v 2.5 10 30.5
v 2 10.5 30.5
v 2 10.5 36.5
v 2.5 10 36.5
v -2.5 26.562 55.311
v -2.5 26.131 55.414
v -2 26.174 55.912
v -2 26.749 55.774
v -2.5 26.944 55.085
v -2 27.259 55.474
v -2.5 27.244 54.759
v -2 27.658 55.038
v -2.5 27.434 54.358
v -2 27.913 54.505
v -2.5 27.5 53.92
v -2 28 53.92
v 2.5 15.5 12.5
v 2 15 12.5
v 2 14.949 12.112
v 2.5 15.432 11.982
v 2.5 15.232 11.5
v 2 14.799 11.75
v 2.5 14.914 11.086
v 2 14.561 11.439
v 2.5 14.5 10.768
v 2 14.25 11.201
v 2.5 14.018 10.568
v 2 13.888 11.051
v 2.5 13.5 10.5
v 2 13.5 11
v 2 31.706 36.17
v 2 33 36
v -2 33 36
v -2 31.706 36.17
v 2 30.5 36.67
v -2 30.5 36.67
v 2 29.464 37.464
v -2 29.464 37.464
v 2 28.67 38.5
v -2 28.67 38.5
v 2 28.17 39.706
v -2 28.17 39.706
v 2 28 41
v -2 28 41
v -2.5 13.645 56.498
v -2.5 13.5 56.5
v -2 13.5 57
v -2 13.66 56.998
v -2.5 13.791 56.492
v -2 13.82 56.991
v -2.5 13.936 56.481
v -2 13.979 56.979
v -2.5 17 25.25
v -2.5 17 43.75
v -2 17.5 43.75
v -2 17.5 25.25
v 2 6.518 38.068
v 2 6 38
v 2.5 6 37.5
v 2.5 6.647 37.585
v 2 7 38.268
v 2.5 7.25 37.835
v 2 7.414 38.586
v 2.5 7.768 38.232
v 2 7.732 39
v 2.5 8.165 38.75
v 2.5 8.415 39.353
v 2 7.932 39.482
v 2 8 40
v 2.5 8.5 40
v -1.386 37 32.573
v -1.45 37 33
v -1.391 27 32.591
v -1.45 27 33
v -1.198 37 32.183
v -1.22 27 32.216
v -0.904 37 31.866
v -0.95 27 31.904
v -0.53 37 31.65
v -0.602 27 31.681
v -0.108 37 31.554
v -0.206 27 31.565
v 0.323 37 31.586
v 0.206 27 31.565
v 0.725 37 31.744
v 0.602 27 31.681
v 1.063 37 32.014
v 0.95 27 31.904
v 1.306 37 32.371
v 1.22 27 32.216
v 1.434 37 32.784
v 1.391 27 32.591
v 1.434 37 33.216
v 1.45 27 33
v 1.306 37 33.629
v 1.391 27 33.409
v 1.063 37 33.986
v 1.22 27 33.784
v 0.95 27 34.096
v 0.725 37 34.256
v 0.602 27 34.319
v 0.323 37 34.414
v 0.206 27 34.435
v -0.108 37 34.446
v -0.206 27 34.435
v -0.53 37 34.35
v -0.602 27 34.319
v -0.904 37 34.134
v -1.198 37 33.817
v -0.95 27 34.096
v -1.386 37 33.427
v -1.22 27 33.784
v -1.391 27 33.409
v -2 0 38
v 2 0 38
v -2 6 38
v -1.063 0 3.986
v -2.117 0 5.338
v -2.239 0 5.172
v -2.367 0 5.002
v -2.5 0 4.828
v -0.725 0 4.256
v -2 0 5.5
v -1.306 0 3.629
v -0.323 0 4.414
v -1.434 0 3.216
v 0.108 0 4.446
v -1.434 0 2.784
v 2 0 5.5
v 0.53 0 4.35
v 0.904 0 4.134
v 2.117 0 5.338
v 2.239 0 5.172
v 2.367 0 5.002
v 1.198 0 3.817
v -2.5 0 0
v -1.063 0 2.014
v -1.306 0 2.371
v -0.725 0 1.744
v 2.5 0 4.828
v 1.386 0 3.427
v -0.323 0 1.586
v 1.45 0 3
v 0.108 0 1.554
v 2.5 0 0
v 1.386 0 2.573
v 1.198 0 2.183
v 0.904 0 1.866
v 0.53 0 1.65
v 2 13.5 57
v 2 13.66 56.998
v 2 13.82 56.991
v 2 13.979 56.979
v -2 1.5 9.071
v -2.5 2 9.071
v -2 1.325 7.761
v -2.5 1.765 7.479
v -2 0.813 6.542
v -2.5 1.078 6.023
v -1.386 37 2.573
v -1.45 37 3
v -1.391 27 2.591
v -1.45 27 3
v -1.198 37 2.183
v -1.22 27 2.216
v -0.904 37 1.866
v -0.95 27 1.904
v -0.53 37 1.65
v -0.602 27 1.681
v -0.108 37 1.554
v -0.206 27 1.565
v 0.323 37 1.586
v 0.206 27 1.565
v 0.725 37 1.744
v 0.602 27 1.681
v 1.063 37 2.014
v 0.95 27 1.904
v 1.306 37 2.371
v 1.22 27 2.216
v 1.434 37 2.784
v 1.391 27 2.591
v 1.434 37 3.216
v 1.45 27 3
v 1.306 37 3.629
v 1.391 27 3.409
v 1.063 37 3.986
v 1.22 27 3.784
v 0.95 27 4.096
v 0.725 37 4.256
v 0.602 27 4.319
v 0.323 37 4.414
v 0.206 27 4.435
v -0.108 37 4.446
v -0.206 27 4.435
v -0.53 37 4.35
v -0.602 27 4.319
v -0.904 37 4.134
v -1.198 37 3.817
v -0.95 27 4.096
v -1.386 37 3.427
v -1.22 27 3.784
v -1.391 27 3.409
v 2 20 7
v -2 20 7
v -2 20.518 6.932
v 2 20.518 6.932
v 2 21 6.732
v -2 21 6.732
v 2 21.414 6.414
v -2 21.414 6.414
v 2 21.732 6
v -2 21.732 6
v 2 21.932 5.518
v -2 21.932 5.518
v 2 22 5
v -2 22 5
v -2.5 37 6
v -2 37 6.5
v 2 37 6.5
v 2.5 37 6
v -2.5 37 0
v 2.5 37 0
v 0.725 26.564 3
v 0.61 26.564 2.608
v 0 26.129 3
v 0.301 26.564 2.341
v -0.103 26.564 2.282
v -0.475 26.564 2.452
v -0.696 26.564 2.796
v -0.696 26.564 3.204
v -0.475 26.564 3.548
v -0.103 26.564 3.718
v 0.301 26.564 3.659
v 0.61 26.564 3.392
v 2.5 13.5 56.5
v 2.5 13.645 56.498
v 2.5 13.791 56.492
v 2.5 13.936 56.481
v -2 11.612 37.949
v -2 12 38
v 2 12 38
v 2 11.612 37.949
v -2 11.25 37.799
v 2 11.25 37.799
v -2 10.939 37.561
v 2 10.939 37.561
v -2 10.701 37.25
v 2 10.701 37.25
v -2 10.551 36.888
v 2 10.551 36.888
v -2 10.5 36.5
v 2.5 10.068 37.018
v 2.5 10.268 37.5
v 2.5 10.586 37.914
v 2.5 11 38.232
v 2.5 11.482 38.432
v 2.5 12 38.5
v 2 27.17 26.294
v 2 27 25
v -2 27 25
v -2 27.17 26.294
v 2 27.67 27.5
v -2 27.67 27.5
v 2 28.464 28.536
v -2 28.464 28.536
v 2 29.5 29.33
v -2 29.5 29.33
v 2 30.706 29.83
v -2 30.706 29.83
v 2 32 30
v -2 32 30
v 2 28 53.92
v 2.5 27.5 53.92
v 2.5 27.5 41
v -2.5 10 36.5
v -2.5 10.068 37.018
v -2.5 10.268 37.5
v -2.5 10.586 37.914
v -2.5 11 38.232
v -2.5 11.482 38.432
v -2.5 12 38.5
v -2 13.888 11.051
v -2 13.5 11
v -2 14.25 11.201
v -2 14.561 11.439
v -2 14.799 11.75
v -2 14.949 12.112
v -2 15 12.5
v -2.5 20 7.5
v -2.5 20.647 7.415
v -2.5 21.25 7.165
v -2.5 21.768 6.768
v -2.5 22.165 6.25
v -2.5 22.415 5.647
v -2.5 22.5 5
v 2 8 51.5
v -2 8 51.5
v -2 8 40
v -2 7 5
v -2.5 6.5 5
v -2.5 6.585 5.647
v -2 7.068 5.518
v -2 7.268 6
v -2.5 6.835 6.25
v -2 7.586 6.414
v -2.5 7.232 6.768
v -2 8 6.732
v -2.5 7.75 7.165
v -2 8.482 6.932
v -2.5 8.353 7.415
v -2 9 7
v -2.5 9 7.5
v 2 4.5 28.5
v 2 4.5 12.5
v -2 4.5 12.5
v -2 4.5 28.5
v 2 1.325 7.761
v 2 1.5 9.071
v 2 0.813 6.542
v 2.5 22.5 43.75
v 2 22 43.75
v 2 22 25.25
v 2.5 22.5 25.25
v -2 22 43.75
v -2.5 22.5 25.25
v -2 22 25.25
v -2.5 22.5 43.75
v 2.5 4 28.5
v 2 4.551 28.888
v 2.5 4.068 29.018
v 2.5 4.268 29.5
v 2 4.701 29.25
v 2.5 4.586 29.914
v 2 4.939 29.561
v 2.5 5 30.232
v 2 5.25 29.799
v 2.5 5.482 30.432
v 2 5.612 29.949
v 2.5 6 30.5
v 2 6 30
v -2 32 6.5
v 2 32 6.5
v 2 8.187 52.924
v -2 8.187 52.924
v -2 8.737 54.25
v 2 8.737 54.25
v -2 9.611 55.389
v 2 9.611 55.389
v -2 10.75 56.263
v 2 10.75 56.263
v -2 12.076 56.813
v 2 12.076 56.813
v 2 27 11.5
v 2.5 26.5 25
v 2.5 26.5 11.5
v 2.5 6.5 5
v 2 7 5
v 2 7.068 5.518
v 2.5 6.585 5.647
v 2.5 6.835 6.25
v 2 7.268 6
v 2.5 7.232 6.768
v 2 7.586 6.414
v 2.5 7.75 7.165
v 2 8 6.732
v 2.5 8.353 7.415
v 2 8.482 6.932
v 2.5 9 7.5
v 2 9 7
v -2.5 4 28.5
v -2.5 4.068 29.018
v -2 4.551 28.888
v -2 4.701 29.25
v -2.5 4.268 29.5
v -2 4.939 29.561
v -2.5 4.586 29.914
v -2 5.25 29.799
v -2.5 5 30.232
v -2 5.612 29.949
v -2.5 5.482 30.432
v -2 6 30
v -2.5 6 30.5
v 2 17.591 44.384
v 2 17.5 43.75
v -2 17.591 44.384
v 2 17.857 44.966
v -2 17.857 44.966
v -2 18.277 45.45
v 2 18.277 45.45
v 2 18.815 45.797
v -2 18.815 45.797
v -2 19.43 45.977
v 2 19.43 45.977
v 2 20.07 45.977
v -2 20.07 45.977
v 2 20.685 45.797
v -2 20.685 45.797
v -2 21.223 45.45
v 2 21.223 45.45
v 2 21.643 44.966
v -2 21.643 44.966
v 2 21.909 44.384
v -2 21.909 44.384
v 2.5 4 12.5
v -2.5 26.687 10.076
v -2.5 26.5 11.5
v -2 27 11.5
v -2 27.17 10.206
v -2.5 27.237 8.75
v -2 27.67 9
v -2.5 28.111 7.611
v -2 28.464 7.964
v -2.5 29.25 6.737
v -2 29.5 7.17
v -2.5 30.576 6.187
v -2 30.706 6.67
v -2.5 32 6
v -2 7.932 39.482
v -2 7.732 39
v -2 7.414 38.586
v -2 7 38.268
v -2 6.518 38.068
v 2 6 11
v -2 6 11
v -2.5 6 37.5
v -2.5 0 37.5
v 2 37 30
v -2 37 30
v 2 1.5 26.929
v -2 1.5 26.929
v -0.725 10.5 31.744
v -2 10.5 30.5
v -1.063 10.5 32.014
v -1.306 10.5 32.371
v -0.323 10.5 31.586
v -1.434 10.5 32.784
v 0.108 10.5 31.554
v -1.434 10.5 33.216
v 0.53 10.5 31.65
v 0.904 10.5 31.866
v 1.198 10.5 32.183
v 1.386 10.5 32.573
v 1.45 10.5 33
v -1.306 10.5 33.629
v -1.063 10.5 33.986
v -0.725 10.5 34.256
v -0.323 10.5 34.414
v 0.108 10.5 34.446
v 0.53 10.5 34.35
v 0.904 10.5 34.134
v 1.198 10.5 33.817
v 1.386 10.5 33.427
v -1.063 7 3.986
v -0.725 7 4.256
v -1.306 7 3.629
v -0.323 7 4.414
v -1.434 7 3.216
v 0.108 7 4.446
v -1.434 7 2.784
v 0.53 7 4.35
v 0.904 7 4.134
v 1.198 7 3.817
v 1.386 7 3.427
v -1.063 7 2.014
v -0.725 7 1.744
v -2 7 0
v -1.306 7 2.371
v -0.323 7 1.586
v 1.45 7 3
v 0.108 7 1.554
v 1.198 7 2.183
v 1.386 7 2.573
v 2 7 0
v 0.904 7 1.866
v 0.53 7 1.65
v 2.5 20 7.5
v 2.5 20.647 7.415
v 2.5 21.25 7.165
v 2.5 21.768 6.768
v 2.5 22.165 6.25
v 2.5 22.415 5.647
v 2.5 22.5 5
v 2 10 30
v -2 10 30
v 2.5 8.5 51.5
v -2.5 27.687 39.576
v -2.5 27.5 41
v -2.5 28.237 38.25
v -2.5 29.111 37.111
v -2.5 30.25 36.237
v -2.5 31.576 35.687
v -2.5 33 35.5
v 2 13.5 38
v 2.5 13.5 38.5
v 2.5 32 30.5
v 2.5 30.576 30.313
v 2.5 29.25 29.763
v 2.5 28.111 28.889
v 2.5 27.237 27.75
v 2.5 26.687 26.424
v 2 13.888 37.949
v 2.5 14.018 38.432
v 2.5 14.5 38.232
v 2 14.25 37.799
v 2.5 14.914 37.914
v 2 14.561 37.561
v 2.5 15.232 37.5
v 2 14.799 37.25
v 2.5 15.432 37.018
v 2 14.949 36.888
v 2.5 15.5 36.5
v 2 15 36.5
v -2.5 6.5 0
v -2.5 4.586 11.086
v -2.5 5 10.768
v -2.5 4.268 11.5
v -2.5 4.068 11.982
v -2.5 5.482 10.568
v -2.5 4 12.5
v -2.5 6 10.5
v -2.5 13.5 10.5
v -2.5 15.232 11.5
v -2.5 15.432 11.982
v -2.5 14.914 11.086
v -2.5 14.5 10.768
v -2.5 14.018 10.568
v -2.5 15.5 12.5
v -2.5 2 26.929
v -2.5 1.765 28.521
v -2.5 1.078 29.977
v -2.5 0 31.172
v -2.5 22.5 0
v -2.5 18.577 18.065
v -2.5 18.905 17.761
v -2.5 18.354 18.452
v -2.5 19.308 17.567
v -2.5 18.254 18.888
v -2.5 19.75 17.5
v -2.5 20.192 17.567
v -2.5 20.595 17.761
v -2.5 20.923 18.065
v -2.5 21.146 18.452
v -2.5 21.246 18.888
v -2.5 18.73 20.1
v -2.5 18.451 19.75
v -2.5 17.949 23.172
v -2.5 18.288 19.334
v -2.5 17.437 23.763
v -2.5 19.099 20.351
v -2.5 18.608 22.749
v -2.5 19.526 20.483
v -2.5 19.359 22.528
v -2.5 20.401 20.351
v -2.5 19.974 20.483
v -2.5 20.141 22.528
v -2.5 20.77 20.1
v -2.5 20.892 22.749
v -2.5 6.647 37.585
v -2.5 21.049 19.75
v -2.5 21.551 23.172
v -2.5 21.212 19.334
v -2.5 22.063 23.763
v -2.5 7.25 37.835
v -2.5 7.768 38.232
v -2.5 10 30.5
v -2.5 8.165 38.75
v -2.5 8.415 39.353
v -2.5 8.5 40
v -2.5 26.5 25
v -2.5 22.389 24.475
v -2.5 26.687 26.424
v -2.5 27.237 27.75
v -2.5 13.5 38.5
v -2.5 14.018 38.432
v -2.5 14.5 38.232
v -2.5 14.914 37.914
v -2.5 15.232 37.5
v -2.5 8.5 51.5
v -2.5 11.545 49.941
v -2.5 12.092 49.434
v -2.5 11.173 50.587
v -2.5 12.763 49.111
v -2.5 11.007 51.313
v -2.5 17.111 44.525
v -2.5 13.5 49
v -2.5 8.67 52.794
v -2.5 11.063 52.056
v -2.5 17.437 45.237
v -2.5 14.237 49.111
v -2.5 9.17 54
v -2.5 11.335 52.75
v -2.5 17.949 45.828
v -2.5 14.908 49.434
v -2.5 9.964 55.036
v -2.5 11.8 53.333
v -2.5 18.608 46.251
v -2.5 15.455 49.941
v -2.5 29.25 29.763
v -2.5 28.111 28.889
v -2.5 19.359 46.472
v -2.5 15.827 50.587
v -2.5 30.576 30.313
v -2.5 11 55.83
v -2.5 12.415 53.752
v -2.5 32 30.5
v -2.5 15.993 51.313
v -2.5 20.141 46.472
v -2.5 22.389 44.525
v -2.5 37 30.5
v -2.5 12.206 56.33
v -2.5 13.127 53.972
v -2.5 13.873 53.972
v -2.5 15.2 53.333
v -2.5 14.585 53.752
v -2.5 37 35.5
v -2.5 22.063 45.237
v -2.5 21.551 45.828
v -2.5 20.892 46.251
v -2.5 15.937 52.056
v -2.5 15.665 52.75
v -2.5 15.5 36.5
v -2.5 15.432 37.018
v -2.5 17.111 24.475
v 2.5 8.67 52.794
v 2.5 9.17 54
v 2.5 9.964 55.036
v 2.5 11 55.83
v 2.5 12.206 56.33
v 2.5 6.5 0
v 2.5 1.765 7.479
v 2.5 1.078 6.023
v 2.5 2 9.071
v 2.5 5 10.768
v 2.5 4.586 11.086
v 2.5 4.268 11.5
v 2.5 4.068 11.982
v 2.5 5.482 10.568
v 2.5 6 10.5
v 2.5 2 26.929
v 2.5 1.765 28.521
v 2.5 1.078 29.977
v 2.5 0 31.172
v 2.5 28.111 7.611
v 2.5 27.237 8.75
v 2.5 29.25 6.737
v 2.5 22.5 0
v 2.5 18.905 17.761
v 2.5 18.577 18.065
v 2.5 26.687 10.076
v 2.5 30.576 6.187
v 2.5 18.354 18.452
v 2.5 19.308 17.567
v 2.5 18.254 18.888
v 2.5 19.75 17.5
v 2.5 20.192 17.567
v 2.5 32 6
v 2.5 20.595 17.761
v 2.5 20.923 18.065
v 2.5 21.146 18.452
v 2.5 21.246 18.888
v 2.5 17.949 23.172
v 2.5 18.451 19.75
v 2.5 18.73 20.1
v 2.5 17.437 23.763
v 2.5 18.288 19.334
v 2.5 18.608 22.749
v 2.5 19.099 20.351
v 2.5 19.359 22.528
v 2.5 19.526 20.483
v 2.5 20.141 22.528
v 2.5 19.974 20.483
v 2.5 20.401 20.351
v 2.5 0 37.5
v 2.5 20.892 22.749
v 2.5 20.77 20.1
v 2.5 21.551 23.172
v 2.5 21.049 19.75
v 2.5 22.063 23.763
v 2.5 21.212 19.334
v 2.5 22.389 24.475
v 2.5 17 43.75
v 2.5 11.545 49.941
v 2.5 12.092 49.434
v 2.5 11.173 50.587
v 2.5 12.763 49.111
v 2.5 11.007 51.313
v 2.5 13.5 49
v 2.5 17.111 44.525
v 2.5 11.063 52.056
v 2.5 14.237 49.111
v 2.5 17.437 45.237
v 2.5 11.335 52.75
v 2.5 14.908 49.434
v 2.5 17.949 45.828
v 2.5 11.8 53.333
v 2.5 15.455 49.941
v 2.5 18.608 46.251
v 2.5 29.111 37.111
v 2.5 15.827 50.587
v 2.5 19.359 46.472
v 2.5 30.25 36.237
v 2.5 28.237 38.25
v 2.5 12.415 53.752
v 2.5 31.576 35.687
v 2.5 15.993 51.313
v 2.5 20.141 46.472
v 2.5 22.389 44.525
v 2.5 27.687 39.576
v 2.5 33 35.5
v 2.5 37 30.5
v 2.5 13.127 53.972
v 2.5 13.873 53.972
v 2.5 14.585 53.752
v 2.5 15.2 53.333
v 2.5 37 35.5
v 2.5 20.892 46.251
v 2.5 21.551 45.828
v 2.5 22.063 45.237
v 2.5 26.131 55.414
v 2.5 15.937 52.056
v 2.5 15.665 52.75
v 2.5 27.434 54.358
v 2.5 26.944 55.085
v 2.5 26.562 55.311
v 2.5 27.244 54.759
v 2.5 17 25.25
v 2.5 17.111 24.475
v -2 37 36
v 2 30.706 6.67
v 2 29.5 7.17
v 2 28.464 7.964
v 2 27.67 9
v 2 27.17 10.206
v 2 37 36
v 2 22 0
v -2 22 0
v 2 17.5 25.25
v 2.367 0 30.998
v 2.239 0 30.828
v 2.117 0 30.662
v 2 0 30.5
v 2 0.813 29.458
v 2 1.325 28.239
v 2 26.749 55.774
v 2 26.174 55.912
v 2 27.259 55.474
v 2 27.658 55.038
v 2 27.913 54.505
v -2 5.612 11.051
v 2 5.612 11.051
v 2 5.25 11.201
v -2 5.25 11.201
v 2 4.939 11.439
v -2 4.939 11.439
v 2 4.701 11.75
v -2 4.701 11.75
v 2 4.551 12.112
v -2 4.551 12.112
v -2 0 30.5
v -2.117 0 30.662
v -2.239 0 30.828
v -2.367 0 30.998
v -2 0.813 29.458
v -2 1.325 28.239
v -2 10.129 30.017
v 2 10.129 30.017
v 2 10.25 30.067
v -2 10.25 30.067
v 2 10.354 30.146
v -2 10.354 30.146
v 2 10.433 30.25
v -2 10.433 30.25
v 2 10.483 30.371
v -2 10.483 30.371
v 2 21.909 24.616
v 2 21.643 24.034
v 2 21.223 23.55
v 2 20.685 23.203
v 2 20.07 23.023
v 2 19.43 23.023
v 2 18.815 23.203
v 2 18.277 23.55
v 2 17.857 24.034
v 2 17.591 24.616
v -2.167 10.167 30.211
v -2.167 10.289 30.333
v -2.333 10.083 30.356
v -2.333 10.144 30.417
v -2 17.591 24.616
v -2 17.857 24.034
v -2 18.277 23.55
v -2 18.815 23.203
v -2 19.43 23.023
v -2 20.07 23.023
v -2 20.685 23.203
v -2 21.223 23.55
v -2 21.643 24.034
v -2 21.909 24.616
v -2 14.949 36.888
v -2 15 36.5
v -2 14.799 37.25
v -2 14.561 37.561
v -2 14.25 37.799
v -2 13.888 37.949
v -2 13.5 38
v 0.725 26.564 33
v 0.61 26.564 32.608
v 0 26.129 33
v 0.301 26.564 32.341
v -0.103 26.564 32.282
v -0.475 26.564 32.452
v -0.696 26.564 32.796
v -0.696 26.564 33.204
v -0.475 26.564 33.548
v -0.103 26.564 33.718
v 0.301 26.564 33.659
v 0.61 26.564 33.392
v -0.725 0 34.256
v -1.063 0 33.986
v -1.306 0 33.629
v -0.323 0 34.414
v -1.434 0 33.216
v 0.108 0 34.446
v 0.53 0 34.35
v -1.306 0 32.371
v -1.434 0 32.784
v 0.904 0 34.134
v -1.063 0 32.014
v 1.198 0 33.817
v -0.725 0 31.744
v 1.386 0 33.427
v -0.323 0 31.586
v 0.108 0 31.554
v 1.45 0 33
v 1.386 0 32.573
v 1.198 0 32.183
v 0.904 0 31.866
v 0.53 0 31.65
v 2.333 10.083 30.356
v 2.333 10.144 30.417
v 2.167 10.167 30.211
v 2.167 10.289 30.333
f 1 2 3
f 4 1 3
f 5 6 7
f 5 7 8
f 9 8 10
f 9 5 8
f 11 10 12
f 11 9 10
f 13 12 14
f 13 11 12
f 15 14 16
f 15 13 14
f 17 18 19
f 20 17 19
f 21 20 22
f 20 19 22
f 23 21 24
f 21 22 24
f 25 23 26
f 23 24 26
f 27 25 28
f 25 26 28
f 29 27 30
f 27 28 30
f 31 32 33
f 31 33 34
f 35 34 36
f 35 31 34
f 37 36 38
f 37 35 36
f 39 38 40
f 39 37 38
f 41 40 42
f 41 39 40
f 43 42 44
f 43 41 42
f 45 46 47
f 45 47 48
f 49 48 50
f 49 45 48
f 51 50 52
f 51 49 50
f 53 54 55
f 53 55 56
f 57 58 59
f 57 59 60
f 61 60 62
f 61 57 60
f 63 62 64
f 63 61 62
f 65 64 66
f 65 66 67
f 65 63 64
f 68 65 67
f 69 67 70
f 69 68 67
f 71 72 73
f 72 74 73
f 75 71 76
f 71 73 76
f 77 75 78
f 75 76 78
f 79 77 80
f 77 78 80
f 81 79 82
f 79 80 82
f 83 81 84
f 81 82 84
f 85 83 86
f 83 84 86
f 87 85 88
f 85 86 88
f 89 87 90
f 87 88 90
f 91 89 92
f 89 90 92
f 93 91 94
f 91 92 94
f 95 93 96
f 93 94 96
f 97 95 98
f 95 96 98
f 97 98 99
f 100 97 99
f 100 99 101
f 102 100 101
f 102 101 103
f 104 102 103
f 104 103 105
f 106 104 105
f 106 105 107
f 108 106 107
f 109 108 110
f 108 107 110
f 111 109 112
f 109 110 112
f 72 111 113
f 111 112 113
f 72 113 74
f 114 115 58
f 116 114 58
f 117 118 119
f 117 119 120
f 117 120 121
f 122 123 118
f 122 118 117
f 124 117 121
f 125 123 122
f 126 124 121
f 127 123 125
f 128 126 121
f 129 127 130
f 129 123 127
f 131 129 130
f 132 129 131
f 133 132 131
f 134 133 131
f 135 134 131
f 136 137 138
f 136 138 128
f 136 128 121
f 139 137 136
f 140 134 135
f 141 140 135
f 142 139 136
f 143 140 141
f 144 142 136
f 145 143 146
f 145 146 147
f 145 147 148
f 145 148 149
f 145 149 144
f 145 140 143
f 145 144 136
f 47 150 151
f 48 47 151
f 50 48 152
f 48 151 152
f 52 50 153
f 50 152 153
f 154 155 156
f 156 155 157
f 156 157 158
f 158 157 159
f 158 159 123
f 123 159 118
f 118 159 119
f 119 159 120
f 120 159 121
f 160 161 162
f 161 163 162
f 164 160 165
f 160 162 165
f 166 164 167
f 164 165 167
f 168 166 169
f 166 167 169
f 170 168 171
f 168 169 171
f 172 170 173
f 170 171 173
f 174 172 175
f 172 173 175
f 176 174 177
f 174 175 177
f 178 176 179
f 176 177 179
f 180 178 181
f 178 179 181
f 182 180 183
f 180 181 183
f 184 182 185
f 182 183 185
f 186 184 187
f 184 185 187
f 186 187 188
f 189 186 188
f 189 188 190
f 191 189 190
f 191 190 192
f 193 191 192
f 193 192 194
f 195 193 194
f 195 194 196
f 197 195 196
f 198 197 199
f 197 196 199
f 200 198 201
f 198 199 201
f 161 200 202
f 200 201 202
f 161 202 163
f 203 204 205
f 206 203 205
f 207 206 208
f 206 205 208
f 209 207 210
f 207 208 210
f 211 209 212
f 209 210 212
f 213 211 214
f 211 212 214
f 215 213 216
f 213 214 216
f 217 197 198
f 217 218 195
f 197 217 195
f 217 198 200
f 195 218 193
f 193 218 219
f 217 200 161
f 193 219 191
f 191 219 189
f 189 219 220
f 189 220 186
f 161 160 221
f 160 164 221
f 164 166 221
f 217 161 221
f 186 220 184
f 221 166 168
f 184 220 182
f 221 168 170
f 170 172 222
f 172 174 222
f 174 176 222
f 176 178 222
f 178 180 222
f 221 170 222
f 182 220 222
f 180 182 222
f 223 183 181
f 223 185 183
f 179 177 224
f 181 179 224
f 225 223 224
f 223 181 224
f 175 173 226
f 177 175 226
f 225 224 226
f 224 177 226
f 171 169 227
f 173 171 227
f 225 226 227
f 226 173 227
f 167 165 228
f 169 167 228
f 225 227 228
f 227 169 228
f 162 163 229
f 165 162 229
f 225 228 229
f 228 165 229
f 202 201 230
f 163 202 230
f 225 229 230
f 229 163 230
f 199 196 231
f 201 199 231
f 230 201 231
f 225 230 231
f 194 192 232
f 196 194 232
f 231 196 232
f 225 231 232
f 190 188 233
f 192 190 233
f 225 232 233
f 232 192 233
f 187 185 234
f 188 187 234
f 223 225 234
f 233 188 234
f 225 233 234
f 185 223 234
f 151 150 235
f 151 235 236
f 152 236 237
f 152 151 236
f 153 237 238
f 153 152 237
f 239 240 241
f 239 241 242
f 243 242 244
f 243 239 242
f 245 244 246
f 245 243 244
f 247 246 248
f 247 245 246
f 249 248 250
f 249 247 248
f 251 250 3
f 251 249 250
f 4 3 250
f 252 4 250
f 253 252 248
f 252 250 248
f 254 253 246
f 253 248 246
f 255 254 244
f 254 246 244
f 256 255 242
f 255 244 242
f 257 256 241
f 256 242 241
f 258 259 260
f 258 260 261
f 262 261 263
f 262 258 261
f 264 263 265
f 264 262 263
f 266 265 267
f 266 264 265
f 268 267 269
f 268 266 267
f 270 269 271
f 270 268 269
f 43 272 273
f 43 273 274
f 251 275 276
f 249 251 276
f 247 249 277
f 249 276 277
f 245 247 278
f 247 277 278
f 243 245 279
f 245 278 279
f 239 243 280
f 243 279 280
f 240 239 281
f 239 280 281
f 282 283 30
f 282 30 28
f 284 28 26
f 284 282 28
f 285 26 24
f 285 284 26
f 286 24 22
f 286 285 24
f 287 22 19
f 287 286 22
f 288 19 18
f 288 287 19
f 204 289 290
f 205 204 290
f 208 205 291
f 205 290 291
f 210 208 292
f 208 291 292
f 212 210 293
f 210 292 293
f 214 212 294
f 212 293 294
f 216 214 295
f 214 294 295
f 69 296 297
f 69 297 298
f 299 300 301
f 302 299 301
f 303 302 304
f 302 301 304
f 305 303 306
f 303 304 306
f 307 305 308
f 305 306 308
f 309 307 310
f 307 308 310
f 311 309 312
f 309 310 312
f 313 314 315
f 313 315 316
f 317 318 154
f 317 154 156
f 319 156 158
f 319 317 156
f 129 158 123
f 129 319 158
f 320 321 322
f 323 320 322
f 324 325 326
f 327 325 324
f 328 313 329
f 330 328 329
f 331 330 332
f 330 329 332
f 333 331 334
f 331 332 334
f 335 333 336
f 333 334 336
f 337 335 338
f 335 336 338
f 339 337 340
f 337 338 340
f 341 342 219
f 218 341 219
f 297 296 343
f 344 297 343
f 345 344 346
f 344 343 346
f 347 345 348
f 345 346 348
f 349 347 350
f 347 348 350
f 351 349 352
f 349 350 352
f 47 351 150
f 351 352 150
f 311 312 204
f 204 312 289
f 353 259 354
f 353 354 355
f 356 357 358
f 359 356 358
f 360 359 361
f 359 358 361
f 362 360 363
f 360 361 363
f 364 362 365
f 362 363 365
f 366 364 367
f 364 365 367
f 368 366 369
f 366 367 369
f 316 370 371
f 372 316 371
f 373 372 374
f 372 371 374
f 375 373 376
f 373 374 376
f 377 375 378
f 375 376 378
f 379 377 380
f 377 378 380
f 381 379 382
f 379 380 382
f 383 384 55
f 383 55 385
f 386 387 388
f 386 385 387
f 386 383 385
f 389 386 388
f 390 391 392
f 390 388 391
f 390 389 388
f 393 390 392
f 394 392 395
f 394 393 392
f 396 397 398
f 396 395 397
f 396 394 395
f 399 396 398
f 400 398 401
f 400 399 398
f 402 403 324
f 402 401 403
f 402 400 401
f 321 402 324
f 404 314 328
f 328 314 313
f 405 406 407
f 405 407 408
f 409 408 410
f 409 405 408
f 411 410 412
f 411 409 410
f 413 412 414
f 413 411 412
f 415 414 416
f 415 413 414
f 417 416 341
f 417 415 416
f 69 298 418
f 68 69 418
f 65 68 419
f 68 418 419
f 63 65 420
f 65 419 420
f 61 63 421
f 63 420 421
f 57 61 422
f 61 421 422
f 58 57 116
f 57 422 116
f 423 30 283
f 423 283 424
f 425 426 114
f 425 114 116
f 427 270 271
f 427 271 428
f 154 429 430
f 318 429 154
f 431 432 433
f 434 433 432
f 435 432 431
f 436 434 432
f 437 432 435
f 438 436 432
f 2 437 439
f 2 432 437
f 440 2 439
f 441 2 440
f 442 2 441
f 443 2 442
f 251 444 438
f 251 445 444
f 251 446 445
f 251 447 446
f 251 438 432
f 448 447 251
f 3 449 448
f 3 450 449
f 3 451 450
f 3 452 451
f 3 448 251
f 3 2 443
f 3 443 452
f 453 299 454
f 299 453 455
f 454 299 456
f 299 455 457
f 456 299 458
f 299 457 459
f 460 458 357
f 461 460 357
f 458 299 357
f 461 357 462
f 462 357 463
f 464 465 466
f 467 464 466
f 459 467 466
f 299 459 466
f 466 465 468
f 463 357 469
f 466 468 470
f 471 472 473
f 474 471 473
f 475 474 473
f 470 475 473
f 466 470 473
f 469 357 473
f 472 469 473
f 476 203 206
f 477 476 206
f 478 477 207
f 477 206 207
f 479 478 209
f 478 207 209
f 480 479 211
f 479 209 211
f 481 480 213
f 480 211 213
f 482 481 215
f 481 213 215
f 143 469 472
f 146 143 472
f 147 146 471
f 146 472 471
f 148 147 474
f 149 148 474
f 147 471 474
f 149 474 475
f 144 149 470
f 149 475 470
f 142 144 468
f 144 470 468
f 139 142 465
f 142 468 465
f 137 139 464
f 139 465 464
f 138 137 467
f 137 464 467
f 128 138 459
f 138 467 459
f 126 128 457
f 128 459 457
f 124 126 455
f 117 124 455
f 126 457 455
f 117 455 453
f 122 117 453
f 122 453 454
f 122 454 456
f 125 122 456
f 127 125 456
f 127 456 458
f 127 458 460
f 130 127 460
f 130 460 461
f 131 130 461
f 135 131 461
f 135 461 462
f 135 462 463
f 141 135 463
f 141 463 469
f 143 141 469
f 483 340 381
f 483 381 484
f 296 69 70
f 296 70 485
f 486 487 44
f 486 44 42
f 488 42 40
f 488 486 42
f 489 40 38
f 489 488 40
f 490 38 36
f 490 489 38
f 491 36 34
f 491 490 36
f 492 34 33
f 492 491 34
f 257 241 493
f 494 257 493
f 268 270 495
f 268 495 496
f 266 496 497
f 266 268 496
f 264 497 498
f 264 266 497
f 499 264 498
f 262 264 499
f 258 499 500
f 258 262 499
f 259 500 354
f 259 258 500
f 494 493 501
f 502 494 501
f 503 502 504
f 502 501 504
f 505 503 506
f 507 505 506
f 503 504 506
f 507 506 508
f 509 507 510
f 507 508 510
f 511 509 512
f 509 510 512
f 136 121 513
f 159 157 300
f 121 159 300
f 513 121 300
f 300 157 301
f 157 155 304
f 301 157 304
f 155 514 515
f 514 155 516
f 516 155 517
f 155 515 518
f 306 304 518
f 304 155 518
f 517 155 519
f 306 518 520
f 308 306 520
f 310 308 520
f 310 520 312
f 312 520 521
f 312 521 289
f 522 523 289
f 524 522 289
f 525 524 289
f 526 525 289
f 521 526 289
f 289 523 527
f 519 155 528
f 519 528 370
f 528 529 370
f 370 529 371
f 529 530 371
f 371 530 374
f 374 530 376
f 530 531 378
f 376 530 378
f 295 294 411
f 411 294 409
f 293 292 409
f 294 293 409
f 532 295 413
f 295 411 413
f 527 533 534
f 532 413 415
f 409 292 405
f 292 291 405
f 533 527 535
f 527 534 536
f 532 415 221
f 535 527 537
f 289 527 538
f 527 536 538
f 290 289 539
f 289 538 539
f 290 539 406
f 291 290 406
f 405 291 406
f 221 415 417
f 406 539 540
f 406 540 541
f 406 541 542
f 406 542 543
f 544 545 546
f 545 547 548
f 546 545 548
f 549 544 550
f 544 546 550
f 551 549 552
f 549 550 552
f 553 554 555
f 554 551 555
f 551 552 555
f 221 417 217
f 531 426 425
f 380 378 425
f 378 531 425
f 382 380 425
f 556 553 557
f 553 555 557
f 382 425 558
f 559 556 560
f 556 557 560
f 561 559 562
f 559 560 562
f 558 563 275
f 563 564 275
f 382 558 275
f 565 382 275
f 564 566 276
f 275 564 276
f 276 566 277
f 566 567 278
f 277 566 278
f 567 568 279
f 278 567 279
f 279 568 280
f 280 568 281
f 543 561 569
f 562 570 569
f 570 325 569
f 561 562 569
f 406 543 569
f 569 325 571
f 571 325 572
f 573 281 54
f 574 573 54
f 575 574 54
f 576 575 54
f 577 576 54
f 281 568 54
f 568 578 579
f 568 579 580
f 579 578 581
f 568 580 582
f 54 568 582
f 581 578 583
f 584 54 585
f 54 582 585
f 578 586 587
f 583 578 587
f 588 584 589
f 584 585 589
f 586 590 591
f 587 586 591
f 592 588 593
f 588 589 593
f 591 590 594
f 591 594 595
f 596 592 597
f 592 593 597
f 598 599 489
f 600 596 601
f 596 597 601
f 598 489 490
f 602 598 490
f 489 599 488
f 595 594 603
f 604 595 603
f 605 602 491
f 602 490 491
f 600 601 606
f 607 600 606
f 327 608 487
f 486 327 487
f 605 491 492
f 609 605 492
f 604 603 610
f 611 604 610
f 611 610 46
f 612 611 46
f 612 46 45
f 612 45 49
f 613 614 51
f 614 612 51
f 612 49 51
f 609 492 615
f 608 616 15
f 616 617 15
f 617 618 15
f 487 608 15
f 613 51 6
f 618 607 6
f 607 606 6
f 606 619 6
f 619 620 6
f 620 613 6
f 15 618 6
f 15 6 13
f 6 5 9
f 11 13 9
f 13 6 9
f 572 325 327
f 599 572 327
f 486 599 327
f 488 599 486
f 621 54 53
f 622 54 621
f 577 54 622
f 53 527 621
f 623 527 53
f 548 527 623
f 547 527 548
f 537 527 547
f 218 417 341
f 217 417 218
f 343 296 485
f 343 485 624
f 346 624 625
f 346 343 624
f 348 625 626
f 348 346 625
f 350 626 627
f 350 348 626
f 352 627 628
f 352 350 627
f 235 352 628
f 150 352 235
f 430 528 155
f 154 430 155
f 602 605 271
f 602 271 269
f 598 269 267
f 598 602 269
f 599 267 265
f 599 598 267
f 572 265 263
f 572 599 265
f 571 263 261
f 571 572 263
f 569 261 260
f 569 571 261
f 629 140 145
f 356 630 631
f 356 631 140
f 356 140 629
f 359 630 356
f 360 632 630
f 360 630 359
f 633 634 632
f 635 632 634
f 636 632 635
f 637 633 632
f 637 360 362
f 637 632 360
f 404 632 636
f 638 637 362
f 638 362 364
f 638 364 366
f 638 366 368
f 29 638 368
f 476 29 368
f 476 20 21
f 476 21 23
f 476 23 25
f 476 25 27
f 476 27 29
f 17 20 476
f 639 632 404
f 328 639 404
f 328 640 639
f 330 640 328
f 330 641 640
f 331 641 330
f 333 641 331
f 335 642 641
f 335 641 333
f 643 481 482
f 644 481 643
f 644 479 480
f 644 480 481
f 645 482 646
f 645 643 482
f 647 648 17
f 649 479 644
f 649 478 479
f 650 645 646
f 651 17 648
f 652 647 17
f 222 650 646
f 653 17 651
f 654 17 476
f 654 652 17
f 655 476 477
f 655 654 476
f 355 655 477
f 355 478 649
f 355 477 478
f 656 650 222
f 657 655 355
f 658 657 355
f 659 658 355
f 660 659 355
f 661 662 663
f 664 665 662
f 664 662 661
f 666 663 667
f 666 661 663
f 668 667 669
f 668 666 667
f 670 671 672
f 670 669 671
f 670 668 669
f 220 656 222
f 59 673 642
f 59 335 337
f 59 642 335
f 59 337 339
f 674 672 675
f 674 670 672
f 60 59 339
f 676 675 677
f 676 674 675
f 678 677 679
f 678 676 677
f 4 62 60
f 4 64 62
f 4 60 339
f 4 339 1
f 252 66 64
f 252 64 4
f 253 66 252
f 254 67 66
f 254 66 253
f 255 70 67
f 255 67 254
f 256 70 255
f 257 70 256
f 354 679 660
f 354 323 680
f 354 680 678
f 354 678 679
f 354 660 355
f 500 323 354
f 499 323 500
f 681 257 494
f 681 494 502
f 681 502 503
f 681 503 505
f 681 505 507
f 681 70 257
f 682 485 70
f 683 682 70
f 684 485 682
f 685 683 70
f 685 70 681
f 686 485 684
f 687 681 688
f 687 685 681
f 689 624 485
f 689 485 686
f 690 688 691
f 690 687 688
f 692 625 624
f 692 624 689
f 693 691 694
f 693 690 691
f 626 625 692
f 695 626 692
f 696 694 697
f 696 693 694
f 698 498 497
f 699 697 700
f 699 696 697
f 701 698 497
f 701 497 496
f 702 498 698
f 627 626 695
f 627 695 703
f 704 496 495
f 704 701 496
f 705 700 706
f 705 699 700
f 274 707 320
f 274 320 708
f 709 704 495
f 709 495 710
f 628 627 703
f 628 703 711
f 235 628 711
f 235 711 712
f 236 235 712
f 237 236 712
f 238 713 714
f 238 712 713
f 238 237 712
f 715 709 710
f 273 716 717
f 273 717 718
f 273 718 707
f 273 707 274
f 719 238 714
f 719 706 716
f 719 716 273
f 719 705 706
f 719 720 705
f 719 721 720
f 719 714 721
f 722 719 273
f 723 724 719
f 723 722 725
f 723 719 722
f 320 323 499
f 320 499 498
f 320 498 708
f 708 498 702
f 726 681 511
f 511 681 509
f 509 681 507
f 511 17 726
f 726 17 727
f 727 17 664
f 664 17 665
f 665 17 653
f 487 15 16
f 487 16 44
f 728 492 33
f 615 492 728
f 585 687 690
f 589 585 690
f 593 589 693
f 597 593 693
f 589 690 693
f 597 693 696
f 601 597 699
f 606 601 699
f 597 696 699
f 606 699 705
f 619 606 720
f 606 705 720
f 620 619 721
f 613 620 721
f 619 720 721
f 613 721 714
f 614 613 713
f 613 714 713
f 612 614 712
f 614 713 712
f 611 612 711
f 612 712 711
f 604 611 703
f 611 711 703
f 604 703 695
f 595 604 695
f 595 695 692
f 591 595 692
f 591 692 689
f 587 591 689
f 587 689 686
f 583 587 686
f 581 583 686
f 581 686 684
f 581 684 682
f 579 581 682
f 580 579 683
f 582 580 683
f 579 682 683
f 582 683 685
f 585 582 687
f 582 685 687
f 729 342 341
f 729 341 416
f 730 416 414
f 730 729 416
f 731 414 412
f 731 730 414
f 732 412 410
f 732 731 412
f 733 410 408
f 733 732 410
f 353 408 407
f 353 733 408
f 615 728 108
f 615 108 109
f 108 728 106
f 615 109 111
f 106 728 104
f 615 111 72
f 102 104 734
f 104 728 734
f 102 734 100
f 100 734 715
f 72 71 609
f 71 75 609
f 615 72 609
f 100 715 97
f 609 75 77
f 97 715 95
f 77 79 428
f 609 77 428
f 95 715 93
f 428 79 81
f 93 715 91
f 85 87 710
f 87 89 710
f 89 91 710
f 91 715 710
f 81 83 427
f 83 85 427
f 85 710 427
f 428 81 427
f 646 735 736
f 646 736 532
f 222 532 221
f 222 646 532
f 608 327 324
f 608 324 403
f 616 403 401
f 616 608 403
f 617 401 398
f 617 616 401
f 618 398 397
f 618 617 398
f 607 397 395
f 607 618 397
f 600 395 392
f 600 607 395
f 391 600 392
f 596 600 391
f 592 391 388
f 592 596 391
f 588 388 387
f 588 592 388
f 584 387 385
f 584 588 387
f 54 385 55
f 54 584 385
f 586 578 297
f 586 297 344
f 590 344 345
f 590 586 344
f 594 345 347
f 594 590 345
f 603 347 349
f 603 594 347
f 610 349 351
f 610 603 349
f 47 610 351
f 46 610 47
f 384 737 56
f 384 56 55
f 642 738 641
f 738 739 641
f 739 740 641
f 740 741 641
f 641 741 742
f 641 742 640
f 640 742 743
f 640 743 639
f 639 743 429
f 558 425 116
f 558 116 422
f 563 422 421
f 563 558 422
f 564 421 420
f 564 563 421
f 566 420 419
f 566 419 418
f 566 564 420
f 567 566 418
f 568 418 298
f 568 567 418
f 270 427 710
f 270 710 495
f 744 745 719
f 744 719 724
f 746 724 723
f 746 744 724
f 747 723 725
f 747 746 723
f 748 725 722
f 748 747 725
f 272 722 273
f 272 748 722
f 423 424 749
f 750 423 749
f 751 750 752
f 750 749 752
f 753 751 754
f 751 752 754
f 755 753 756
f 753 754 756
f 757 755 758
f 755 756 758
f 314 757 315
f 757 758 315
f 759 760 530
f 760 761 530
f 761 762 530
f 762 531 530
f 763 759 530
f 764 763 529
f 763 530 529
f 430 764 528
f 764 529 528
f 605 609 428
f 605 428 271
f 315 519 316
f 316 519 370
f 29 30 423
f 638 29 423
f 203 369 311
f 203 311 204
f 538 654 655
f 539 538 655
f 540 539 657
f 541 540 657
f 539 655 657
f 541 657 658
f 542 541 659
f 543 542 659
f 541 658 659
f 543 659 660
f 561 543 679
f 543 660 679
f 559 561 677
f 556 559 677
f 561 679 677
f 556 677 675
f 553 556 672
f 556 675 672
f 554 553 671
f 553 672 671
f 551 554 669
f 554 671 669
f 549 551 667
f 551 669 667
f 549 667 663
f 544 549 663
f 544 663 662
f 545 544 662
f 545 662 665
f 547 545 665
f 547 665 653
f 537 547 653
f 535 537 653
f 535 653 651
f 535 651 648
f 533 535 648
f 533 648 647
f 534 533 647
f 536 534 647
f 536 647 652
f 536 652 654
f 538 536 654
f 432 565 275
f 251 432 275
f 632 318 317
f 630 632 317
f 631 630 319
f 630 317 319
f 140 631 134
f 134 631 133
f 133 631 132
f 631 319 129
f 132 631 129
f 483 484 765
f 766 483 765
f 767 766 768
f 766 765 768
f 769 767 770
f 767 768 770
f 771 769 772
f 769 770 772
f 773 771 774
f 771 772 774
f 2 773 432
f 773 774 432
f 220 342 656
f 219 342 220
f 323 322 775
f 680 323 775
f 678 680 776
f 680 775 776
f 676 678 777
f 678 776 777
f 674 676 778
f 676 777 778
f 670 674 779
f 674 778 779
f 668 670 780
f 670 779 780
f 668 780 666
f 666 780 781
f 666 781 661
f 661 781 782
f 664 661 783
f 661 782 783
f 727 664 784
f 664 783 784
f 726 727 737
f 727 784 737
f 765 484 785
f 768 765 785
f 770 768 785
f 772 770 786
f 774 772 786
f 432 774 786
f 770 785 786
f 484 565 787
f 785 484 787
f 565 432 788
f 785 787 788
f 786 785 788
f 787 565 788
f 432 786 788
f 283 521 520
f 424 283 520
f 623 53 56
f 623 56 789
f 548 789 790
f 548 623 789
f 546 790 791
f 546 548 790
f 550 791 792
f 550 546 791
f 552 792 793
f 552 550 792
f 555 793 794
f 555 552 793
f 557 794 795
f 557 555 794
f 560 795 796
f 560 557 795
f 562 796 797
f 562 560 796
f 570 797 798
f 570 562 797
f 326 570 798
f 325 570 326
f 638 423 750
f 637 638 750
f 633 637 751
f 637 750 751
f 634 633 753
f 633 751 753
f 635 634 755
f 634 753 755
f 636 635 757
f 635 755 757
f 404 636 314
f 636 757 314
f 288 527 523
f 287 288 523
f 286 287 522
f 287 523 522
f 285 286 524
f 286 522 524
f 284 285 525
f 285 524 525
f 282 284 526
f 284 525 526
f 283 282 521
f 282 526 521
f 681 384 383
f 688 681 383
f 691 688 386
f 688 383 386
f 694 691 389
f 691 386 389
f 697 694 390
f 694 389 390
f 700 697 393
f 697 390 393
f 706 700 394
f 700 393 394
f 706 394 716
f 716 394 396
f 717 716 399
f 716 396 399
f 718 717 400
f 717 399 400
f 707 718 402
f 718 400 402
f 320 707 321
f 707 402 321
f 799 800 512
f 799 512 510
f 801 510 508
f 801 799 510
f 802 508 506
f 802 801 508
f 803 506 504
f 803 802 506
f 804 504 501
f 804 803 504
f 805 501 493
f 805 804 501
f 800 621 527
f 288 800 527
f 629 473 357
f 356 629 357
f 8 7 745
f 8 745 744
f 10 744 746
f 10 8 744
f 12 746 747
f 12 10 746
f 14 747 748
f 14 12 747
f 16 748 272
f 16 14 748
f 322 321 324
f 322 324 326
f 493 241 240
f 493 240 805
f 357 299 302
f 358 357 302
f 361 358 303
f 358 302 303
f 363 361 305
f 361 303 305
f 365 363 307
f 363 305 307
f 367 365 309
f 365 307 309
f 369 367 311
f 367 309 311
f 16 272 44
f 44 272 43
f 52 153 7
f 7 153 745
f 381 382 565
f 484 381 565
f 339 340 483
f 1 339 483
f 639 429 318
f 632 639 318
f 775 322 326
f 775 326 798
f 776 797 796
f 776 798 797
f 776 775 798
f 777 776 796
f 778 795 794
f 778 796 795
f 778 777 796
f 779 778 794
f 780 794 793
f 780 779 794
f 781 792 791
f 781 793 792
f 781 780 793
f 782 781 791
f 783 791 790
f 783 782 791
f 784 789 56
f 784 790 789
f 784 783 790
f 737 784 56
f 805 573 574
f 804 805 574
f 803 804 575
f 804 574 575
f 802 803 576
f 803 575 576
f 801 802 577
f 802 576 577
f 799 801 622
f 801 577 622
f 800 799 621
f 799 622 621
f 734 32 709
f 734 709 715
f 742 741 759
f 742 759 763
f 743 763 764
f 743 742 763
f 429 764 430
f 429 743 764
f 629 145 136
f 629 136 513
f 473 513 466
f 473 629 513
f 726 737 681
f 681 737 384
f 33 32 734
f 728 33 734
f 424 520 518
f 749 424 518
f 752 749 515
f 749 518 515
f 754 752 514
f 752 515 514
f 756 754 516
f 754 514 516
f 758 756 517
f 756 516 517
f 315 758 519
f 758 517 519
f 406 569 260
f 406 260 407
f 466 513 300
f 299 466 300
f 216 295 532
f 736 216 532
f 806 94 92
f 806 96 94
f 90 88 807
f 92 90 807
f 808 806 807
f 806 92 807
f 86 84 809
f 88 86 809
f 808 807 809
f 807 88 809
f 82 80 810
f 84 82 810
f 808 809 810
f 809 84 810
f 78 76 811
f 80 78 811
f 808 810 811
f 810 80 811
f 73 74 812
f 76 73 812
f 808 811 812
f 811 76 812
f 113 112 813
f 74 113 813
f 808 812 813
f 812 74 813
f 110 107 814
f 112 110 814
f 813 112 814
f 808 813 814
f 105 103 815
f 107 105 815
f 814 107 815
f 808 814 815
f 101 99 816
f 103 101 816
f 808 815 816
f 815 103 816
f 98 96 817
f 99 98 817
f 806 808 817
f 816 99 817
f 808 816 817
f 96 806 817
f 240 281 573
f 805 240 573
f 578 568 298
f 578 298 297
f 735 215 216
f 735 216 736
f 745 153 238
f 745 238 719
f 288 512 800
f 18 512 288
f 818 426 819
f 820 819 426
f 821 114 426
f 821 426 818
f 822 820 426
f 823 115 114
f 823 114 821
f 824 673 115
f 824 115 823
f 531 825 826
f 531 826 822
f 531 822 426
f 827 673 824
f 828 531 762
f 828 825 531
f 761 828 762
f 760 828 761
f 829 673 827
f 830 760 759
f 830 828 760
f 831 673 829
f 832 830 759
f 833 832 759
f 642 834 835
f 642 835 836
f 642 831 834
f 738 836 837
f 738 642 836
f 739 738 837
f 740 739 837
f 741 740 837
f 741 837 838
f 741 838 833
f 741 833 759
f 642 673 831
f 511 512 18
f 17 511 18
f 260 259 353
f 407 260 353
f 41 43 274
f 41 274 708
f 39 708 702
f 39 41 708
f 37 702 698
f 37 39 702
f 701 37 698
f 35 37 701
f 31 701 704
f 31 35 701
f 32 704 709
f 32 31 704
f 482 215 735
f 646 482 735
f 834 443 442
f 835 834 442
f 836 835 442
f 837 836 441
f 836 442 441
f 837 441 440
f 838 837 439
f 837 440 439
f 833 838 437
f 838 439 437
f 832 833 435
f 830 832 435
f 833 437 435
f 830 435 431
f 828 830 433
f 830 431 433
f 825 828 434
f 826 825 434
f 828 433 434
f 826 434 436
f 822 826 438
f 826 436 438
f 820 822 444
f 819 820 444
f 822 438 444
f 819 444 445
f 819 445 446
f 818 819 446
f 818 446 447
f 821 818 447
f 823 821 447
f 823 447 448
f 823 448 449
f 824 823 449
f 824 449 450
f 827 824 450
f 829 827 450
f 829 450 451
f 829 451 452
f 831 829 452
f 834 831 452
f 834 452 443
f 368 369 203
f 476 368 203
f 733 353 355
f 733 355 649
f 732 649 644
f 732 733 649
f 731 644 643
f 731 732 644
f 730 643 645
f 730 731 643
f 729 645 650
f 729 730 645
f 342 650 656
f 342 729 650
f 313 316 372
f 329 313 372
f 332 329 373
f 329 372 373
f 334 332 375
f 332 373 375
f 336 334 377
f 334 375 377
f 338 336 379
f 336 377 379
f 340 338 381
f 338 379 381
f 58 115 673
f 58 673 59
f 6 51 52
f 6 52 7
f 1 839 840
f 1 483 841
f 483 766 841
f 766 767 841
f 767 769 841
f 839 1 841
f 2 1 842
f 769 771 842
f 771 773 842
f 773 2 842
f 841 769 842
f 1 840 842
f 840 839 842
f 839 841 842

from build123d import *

# Parameters (mm, degrees)
ESQUISSE1_W             = 57
ESQUISSE1_H             = 37
BOSS_EXTRU_1_DEPTH      = 2.5
ESQUISSE2_W             = 7
ESQUISSE2_H             = 15
ENL_V_MAT_EXTRU_1_DEPTH = 69.139562664
ESQUISSE3_W             = 23.5
ESQUISSE3_H             = 10
ENL_V_MAT_EXTRU_2_DEPTH = 69.139562664
ESQUISSE4_W             = 21
ESQUISSE4_H             = 9
ENL_V_MAT_EXTRU_3_DEPTH = 69.139562664
ESQUISSE5_W             = 19
ESQUISSE5_H             = 8
ENL_V_MAT_EXTRU_4_DEPTH = 69.139562664
ESQUISSE6_R             = 2.5
ENL_V_MAT_EXTRU_5_DEPTH = 5
ENL_V_MAT_EXTRU_6_DEPTH = 69.139562664
ESQUISSE8_R             = 1.5
ENL_V_MAT_EXTRU_7_DEPTH = 69.139562664
ESQUISSE9_W             = 25
ESQUISSE9_H             = 1.5
ENL_V_MAT_EXTRU_8_DEPTH = 69.139562664
CONG_1_R                = 5
CONG_2_R                = 1.5
CONG_3_R                = 0.5
CONG_4_R                = 2
CONG_5_R                = 2
TROU_TARAUD_M3_51_D     = 2.9
TROU_TARAUD_M3_51_DEPTH = 12
TROU_TARAUD_M3_51_TIP   = 0.871247898
TROU_TARAUD_M3_52_D     = 2.9
TROU_TARAUD_M3_52_DEPTH = 10
TROU_TARAUD_M3_52_TIP   = 0.871247898
CHANFREIN1_SIZE         = 0.5


with BuildPart() as part:
    # Esquisse1 → Boss.-Extru.1 (new, symmetric)
    with BuildSketch(Plane(origin=(0, 0, 0), x_dir=(0, 0, -1), z_dir=(1, 0, 0))):
        with Locations((-28.5, 18.5)):
            Rectangle(ESQUISSE1_W, ESQUISSE1_H)
    extrude(amount=BOSS_EXTRU_1_DEPTH, both=True)

    # Esquisse2 → Enlèv. mat.-Extru.1 (cut, through all)
    with BuildSketch(Plane(origin=(2.5, 0, 0), x_dir=(0, 0, -1), z_dir=(1, 0, 0))):
        with Locations((-3.5, 14.5)):
            Rectangle(ESQUISSE2_W, ESQUISSE2_H)
    extrude(amount=-ENL_V_MAT_EXTRU_1_DEPTH, mode=Mode.SUBTRACT)

    # Esquisse3 → Enlèv. mat.-Extru.2 (cut, through all)
    with BuildSketch(Plane(origin=(2.5, 0, 0), x_dir=(0, 0, -1), z_dir=(1, 0, 0))):
        with Locations((-18.25, 32)):
            Rectangle(ESQUISSE3_W, ESQUISSE3_H)
    extrude(amount=-ENL_V_MAT_EXTRU_2_DEPTH, mode=Mode.SUBTRACT)

    # Esquisse4 → Enlèv. mat.-Extru.3 (cut, through all)
    with BuildSketch(Plane(origin=(2.5, 0, 0), x_dir=(0, 0, -1), z_dir=(1, 0, 0))):
        with Locations((-46.5, 32.5)):
            Rectangle(ESQUISSE4_W, ESQUISSE4_H)
    extrude(amount=-ENL_V_MAT_EXTRU_3_DEPTH, mode=Mode.SUBTRACT)

    # Esquisse5 → Enlèv. mat.-Extru.4 (cut, through all)
    with BuildSketch(Plane(origin=(2.5, 0, 0), x_dir=(0, 0, -1), z_dir=(1, 0, 0))):
        with Locations((-47.5, 4)):
            Rectangle(ESQUISSE5_W, ESQUISSE5_H)
    extrude(amount=-ENL_V_MAT_EXTRU_4_DEPTH, mode=Mode.SUBTRACT)

    # Esquisse6 → Enlèv. mat.-Extru.5 (cut)
    with BuildSketch(Plane(origin=(2.5, 0, 0), x_dir=(0, 0, -1), z_dir=(1, 0, 0))):
        with BuildLine():
            Line((-57, 28), (-57, 13.5))
            ThreePointArc((-57, 13.5), (-56.994765219, 13.739906631), (-56.97907084, 13.979356585))
            Line((-56.97907084, 13.979356585), (-55.752423485, 28))
            Line((-55.752423485, 28), (-57, 28))
        make_face()
        with BuildLine():
            Line((-57, 8), (-51.5, 8))
            ThreePointArc((-51.5, 8), (-55.389087297, 9.610912703), (-57, 13.5))
            Line((-57, 13.5), (-57, 8))
        make_face()
        with Locations((-51.5, 13.5)):
            Circle(ESQUISSE6_R)
    extrude(amount=-ENL_V_MAT_EXTRU_5_DEPTH, mode=Mode.SUBTRACT)

    # Esquisse7 → Enlèv. mat.-Extru.6 (cut, through all)
    with BuildSketch(Plane(origin=(2.5, 0, 0), x_dir=(0, 0, -1), z_dir=(1, 0, 0))):
        Polygon((-38, 15), (-11, 15), (-11, 4.5), (-30, 4.5), (-30, 10.5), (-38, 10.5), align=None)
    extrude(amount=-ENL_V_MAT_EXTRU_6_DEPTH, mode=Mode.SUBTRACT)

    # Esquisse8 → Enlèv. mat.-Extru.7 (cut, through all)
    with BuildSketch(Plane(origin=(2.5, 0, 0), x_dir=(0, 0, -1), z_dir=(1, 0, 0))):
        with Locations((-19, 19.75)):
            Circle(ESQUISSE8_R)
        with BuildLine():
            Line((-43.75, 22), (-25.25, 22))
            ThreePointArc((-25.25, 22), (-23, 19.75), (-25.25, 17.5))
            Line((-25.25, 17.5), (-43.75, 17.5))
            ThreePointArc((-43.75, 17.5), (-46, 19.75), (-43.75, 22))
        make_face()
    extrude(amount=-ENL_V_MAT_EXTRU_7_DEPTH, mode=Mode.SUBTRACT)

    # Esquisse9 → Enlèv. mat.-Extru.8 (cut, through all)
    with BuildSketch(Plane(origin=(2.5, 0, 0), x_dir=(0, 0, -1), z_dir=(1, 0, 0))):
        with Locations((-18, 0.75)):
            Rectangle(ESQUISSE9_W, ESQUISSE9_H)
    extrude(amount=-ENL_V_MAT_EXTRU_8_DEPTH, mode=Mode.SUBTRACT)

    # Congé1
    # the kernel refuses this fillet: 5 mm, written as the material it adds along each edge
    with BuildSketch(Plane(origin=(2.5, 27, 30), x_dir=(0, 0, -1), z_dir=(-1, 0, 0)), Plane(origin=(2.5, 28, 36), x_dir=(0, 1, 0), z_dir=(-1, 0, 0)), Plane(origin=(2.5, 27, 6.5), x_dir=(0, 1, 0), z_dir=(-1, 0, 0))) as cong_1_piece_1:
        with BuildLine():
            CenterArc((CONG_1_R, -CONG_1_R), CONG_1_R, 90, 90)
            Line((0, -CONG_1_R), (-CONG_1_R * 0.02, -CONG_1_R))
            Line((-CONG_1_R * 0.02, -CONG_1_R), (-CONG_1_R * 0.02, CONG_1_R * 0.02))
            Line((-CONG_1_R * 0.02, CONG_1_R * 0.02), (CONG_1_R, CONG_1_R * 0.02))
            Line((CONG_1_R, CONG_1_R * 0.02), (CONG_1_R, 0))
        make_face()
    extrude(amount=5)
    with BuildSketch(Plane(origin=(2.5, 1.5, 5.5), x_dir=(0, -1, 0), z_dir=(-1, 0, 0))) as cong_1_piece_2:
        with BuildLine():
            CenterArc((5, 3.570714214), CONG_1_R, 180, 45.572995999)
            Line((0, 3.570714214), (-0.1, 3.570714214))
            Line((-0.1, 3.570714214), (-0.1, 0))
            Line((-0.1, 0), (0, -0.1))
            ThreePointArc((0, -0.1), (0.75, -0.1), (1.43, -0.071414284))
            Line((1.43, -0.071414284), (1.5, 0))
        make_face()
    extrude(amount=5)
    with BuildSketch(Plane(origin=(2.5, 1.5, 30.5), x_dir=(0, -1, 0), z_dir=(-1, 0, 0))) as cong_1_piece_3:
        with BuildLine():
            CenterArc((5, -3.570714214), CONG_1_R, 134.427004001, 45.572995999)
            Line((0, -3.570714214), (-0.1, -3.570714214))
            Line((-0.1, -3.570714214), (-0.1, 0))
            Line((-0.1, 0), (0, 0.1))
            ThreePointArc((0, 0.1), (0.75, 0.1), (1.43, 0.071414284))
            Line((1.43, 0.071414284), (1.5, 0))
        make_face()
    extrude(amount=5)

    # Congé2
    cong_2_edges = [part.edges().sort_by_distance(p)[0] for p in [
        (0, 10.5, 38),
        (0, 15, 38),
        (0, 15, 11),
        (0, 4.5, 11),
        (0, 4.5, 30),
    ]]
    fillet(cong_2_edges, radius=CONG_2_R)

    # Congé3
    cong_3_edges = [part.edges().sort_by_distance(p)[0] for p in [
        (0, 10.5, 30),
    ]]
    fillet(cong_3_edges, radius=CONG_3_R)

    # Congé4
    cong_4_edges = [part.edges().sort_by_distance(p)[0] for p in [
        (0, 7, 7),
        (0, 22, 7),
        (0, 8, 38),
    ]]
    fillet(cong_4_edges, radius=CONG_4_R)

    # Congé5
    cong_5_edges = [part.edges().sort_by_distance(p)[0] for p in [
        (0, 28, 55.752423485),
    ]]
    fillet(cong_5_edges, radius=CONG_5_R)

    # Trou taraudé M3.51
    with Locations(Plane(origin=(0, 0, 0), x_dir=(-1, 0, 0), z_dir=(0, -1, 0))):
        with Locations((0, -3), (0, -33)):
            Hole(TROU_TARAUD_M3_51_D / 2, depth=TROU_TARAUD_M3_51_DEPTH)
            with Locations((0, 0, -(TROU_TARAUD_M3_51_DEPTH + TROU_TARAUD_M3_51_TIP / 2))):  # 118° drill point
                Cone(0, TROU_TARAUD_M3_51_D / 2, TROU_TARAUD_M3_51_TIP, mode=Mode.SUBTRACT)

    # Trou taraudé M3.52
    with Locations(Plane(origin=(0, 37, 0), x_dir=(1, 0, 0), z_dir=(0, 1, 0))):
        with Locations((0, -33), (0, -3)):
            Hole(TROU_TARAUD_M3_52_D / 2, depth=TROU_TARAUD_M3_52_DEPTH)
            with Locations((0, 0, -(TROU_TARAUD_M3_52_DEPTH + TROU_TARAUD_M3_52_TIP / 2))):  # 118° drill point
                Cone(0, TROU_TARAUD_M3_52_D / 2, TROU_TARAUD_M3_52_TIP, mode=Mode.SUBTRACT)

    # Chanfrein1
    chanfrein1_edges = [part.edges().sort_by_distance(p)[0] for p in [
        (-2.5, 19.75, 46),
        (-2.5, 22, 34.5),
        (-2.5, 19.75, 23),
        (-2.5, 17.5, 34.5),
        (2.5, 19.75, 46),
        (2.5, 17.5, 34.5),
        (2.5, 19.75, 23),
        (2.5, 22, 34.5),
        (2.5, 1.5, 18),
        (-2.5, 1.5, 18),
        (2.5, 35, 36),
        (-2.5, 35, 36),
        (2.5, 34.5, 6.5),
        (-2.5, 34.5, 6.5),
        (2.5, 27, 18.25),
        (-2.5, 27, 18.25),
        (2.5, 1.109772229, 7.134222541),
        (-2.5, 1.109772229, 7.134222541),
        (2.5, 1.109772229, 28.865777459),
        (-2.5, 1.109772229, 28.865777459),
        (2.5, 29.464466094, 37.464466094),
        (-2.5, 29.464466094, 37.464466094),
        (2.5, 28.464466094, 7.964466094),
        (-2.5, 28.464466094, 7.964466094),
        (2.5, 28.464466094, 28.535533906),
        (-2.5, 28.464466094, 28.535533906),
        (2.5, 15, 24.5),
        (-2.5, 15, 24.5),
        (-2.5, 22, 2.5),
        (2.5, 9.75, 11),
        (-2.5, 9.75, 11),
        (2.5, 4.5, 20.5),
        (-2.5, 4.5, 20.5),
        (2.5, 10.5, 33.5),
        (2.5, 22, 2.5),
        (-2.5, 10.5, 33.5),
        (2.5, 12.75, 38),
        (-2.5, 12.75, 38),
        (2.5, 14.560660172, 11.439339828),
        (-2.5, 14.560660172, 11.439339828),
        (2.5, 4.939339828, 11.439339828),
        (-2.5, 4.939339828, 11.439339828),
        (2.5, 4.939339828, 29.560660172),
        (-2.5, 4.939339828, 29.560660172),
        (2.5, 10.939339828, 37.560660172),
        (-2.5, 10.939339828, 37.560660172),
        (2.5, 14.560660172, 37.560660172),
        (-2.5, 14.560660172, 37.560660172),
        (2.5, 8, 30),
        (-2.5, 8, 30),
        (2.5, 10.353553391, 30.146446609),
        (-2.5, 10.353553391, 30.146446609),
        (2.5, 7, 2.5),
        (-2.5, 7, 2.5),
        (2.5, 14.5, 7),
        (-2.5, 14.5, 7),
        (-2.5, 8, 45.75),
        (2.5, 8, 45.75),
        (2.5, 7.585786438, 6.414213562),
        (-2.5, 7.585786438, 6.414213562),
        (2.5, 21.414213562, 6.414213562),
        (-2.5, 21.414213562, 6.414213562),
        (2.5, 7.414213562, 38.585786438),
        (-2.5, 7.414213562, 38.585786438),
        (2.5, 28, 47.459880569),
        (-2.5, 28, 47.459880569),
        (2.5, 20.076834035, 56.445610687),
        (2.5, 27.474554674, 55.270941553),
        (-2.5, 20.076834035, 56.445610687),
        (-2.5, 27.474554674, 55.270941553),
        (-2.5, 34.5, 30),
        (2.5, 34.5, 30),
        (-2.5, 3, 38),
        (2.5, 3, 38),
        (2.5, 9.784253858, 55.555025352),
        (-2.5, 9.784253858, 55.555025352),
    ]]
    chamfer(chanfrein1_edges, length=CHANFREIN1_SIZE)


solid = part.part
